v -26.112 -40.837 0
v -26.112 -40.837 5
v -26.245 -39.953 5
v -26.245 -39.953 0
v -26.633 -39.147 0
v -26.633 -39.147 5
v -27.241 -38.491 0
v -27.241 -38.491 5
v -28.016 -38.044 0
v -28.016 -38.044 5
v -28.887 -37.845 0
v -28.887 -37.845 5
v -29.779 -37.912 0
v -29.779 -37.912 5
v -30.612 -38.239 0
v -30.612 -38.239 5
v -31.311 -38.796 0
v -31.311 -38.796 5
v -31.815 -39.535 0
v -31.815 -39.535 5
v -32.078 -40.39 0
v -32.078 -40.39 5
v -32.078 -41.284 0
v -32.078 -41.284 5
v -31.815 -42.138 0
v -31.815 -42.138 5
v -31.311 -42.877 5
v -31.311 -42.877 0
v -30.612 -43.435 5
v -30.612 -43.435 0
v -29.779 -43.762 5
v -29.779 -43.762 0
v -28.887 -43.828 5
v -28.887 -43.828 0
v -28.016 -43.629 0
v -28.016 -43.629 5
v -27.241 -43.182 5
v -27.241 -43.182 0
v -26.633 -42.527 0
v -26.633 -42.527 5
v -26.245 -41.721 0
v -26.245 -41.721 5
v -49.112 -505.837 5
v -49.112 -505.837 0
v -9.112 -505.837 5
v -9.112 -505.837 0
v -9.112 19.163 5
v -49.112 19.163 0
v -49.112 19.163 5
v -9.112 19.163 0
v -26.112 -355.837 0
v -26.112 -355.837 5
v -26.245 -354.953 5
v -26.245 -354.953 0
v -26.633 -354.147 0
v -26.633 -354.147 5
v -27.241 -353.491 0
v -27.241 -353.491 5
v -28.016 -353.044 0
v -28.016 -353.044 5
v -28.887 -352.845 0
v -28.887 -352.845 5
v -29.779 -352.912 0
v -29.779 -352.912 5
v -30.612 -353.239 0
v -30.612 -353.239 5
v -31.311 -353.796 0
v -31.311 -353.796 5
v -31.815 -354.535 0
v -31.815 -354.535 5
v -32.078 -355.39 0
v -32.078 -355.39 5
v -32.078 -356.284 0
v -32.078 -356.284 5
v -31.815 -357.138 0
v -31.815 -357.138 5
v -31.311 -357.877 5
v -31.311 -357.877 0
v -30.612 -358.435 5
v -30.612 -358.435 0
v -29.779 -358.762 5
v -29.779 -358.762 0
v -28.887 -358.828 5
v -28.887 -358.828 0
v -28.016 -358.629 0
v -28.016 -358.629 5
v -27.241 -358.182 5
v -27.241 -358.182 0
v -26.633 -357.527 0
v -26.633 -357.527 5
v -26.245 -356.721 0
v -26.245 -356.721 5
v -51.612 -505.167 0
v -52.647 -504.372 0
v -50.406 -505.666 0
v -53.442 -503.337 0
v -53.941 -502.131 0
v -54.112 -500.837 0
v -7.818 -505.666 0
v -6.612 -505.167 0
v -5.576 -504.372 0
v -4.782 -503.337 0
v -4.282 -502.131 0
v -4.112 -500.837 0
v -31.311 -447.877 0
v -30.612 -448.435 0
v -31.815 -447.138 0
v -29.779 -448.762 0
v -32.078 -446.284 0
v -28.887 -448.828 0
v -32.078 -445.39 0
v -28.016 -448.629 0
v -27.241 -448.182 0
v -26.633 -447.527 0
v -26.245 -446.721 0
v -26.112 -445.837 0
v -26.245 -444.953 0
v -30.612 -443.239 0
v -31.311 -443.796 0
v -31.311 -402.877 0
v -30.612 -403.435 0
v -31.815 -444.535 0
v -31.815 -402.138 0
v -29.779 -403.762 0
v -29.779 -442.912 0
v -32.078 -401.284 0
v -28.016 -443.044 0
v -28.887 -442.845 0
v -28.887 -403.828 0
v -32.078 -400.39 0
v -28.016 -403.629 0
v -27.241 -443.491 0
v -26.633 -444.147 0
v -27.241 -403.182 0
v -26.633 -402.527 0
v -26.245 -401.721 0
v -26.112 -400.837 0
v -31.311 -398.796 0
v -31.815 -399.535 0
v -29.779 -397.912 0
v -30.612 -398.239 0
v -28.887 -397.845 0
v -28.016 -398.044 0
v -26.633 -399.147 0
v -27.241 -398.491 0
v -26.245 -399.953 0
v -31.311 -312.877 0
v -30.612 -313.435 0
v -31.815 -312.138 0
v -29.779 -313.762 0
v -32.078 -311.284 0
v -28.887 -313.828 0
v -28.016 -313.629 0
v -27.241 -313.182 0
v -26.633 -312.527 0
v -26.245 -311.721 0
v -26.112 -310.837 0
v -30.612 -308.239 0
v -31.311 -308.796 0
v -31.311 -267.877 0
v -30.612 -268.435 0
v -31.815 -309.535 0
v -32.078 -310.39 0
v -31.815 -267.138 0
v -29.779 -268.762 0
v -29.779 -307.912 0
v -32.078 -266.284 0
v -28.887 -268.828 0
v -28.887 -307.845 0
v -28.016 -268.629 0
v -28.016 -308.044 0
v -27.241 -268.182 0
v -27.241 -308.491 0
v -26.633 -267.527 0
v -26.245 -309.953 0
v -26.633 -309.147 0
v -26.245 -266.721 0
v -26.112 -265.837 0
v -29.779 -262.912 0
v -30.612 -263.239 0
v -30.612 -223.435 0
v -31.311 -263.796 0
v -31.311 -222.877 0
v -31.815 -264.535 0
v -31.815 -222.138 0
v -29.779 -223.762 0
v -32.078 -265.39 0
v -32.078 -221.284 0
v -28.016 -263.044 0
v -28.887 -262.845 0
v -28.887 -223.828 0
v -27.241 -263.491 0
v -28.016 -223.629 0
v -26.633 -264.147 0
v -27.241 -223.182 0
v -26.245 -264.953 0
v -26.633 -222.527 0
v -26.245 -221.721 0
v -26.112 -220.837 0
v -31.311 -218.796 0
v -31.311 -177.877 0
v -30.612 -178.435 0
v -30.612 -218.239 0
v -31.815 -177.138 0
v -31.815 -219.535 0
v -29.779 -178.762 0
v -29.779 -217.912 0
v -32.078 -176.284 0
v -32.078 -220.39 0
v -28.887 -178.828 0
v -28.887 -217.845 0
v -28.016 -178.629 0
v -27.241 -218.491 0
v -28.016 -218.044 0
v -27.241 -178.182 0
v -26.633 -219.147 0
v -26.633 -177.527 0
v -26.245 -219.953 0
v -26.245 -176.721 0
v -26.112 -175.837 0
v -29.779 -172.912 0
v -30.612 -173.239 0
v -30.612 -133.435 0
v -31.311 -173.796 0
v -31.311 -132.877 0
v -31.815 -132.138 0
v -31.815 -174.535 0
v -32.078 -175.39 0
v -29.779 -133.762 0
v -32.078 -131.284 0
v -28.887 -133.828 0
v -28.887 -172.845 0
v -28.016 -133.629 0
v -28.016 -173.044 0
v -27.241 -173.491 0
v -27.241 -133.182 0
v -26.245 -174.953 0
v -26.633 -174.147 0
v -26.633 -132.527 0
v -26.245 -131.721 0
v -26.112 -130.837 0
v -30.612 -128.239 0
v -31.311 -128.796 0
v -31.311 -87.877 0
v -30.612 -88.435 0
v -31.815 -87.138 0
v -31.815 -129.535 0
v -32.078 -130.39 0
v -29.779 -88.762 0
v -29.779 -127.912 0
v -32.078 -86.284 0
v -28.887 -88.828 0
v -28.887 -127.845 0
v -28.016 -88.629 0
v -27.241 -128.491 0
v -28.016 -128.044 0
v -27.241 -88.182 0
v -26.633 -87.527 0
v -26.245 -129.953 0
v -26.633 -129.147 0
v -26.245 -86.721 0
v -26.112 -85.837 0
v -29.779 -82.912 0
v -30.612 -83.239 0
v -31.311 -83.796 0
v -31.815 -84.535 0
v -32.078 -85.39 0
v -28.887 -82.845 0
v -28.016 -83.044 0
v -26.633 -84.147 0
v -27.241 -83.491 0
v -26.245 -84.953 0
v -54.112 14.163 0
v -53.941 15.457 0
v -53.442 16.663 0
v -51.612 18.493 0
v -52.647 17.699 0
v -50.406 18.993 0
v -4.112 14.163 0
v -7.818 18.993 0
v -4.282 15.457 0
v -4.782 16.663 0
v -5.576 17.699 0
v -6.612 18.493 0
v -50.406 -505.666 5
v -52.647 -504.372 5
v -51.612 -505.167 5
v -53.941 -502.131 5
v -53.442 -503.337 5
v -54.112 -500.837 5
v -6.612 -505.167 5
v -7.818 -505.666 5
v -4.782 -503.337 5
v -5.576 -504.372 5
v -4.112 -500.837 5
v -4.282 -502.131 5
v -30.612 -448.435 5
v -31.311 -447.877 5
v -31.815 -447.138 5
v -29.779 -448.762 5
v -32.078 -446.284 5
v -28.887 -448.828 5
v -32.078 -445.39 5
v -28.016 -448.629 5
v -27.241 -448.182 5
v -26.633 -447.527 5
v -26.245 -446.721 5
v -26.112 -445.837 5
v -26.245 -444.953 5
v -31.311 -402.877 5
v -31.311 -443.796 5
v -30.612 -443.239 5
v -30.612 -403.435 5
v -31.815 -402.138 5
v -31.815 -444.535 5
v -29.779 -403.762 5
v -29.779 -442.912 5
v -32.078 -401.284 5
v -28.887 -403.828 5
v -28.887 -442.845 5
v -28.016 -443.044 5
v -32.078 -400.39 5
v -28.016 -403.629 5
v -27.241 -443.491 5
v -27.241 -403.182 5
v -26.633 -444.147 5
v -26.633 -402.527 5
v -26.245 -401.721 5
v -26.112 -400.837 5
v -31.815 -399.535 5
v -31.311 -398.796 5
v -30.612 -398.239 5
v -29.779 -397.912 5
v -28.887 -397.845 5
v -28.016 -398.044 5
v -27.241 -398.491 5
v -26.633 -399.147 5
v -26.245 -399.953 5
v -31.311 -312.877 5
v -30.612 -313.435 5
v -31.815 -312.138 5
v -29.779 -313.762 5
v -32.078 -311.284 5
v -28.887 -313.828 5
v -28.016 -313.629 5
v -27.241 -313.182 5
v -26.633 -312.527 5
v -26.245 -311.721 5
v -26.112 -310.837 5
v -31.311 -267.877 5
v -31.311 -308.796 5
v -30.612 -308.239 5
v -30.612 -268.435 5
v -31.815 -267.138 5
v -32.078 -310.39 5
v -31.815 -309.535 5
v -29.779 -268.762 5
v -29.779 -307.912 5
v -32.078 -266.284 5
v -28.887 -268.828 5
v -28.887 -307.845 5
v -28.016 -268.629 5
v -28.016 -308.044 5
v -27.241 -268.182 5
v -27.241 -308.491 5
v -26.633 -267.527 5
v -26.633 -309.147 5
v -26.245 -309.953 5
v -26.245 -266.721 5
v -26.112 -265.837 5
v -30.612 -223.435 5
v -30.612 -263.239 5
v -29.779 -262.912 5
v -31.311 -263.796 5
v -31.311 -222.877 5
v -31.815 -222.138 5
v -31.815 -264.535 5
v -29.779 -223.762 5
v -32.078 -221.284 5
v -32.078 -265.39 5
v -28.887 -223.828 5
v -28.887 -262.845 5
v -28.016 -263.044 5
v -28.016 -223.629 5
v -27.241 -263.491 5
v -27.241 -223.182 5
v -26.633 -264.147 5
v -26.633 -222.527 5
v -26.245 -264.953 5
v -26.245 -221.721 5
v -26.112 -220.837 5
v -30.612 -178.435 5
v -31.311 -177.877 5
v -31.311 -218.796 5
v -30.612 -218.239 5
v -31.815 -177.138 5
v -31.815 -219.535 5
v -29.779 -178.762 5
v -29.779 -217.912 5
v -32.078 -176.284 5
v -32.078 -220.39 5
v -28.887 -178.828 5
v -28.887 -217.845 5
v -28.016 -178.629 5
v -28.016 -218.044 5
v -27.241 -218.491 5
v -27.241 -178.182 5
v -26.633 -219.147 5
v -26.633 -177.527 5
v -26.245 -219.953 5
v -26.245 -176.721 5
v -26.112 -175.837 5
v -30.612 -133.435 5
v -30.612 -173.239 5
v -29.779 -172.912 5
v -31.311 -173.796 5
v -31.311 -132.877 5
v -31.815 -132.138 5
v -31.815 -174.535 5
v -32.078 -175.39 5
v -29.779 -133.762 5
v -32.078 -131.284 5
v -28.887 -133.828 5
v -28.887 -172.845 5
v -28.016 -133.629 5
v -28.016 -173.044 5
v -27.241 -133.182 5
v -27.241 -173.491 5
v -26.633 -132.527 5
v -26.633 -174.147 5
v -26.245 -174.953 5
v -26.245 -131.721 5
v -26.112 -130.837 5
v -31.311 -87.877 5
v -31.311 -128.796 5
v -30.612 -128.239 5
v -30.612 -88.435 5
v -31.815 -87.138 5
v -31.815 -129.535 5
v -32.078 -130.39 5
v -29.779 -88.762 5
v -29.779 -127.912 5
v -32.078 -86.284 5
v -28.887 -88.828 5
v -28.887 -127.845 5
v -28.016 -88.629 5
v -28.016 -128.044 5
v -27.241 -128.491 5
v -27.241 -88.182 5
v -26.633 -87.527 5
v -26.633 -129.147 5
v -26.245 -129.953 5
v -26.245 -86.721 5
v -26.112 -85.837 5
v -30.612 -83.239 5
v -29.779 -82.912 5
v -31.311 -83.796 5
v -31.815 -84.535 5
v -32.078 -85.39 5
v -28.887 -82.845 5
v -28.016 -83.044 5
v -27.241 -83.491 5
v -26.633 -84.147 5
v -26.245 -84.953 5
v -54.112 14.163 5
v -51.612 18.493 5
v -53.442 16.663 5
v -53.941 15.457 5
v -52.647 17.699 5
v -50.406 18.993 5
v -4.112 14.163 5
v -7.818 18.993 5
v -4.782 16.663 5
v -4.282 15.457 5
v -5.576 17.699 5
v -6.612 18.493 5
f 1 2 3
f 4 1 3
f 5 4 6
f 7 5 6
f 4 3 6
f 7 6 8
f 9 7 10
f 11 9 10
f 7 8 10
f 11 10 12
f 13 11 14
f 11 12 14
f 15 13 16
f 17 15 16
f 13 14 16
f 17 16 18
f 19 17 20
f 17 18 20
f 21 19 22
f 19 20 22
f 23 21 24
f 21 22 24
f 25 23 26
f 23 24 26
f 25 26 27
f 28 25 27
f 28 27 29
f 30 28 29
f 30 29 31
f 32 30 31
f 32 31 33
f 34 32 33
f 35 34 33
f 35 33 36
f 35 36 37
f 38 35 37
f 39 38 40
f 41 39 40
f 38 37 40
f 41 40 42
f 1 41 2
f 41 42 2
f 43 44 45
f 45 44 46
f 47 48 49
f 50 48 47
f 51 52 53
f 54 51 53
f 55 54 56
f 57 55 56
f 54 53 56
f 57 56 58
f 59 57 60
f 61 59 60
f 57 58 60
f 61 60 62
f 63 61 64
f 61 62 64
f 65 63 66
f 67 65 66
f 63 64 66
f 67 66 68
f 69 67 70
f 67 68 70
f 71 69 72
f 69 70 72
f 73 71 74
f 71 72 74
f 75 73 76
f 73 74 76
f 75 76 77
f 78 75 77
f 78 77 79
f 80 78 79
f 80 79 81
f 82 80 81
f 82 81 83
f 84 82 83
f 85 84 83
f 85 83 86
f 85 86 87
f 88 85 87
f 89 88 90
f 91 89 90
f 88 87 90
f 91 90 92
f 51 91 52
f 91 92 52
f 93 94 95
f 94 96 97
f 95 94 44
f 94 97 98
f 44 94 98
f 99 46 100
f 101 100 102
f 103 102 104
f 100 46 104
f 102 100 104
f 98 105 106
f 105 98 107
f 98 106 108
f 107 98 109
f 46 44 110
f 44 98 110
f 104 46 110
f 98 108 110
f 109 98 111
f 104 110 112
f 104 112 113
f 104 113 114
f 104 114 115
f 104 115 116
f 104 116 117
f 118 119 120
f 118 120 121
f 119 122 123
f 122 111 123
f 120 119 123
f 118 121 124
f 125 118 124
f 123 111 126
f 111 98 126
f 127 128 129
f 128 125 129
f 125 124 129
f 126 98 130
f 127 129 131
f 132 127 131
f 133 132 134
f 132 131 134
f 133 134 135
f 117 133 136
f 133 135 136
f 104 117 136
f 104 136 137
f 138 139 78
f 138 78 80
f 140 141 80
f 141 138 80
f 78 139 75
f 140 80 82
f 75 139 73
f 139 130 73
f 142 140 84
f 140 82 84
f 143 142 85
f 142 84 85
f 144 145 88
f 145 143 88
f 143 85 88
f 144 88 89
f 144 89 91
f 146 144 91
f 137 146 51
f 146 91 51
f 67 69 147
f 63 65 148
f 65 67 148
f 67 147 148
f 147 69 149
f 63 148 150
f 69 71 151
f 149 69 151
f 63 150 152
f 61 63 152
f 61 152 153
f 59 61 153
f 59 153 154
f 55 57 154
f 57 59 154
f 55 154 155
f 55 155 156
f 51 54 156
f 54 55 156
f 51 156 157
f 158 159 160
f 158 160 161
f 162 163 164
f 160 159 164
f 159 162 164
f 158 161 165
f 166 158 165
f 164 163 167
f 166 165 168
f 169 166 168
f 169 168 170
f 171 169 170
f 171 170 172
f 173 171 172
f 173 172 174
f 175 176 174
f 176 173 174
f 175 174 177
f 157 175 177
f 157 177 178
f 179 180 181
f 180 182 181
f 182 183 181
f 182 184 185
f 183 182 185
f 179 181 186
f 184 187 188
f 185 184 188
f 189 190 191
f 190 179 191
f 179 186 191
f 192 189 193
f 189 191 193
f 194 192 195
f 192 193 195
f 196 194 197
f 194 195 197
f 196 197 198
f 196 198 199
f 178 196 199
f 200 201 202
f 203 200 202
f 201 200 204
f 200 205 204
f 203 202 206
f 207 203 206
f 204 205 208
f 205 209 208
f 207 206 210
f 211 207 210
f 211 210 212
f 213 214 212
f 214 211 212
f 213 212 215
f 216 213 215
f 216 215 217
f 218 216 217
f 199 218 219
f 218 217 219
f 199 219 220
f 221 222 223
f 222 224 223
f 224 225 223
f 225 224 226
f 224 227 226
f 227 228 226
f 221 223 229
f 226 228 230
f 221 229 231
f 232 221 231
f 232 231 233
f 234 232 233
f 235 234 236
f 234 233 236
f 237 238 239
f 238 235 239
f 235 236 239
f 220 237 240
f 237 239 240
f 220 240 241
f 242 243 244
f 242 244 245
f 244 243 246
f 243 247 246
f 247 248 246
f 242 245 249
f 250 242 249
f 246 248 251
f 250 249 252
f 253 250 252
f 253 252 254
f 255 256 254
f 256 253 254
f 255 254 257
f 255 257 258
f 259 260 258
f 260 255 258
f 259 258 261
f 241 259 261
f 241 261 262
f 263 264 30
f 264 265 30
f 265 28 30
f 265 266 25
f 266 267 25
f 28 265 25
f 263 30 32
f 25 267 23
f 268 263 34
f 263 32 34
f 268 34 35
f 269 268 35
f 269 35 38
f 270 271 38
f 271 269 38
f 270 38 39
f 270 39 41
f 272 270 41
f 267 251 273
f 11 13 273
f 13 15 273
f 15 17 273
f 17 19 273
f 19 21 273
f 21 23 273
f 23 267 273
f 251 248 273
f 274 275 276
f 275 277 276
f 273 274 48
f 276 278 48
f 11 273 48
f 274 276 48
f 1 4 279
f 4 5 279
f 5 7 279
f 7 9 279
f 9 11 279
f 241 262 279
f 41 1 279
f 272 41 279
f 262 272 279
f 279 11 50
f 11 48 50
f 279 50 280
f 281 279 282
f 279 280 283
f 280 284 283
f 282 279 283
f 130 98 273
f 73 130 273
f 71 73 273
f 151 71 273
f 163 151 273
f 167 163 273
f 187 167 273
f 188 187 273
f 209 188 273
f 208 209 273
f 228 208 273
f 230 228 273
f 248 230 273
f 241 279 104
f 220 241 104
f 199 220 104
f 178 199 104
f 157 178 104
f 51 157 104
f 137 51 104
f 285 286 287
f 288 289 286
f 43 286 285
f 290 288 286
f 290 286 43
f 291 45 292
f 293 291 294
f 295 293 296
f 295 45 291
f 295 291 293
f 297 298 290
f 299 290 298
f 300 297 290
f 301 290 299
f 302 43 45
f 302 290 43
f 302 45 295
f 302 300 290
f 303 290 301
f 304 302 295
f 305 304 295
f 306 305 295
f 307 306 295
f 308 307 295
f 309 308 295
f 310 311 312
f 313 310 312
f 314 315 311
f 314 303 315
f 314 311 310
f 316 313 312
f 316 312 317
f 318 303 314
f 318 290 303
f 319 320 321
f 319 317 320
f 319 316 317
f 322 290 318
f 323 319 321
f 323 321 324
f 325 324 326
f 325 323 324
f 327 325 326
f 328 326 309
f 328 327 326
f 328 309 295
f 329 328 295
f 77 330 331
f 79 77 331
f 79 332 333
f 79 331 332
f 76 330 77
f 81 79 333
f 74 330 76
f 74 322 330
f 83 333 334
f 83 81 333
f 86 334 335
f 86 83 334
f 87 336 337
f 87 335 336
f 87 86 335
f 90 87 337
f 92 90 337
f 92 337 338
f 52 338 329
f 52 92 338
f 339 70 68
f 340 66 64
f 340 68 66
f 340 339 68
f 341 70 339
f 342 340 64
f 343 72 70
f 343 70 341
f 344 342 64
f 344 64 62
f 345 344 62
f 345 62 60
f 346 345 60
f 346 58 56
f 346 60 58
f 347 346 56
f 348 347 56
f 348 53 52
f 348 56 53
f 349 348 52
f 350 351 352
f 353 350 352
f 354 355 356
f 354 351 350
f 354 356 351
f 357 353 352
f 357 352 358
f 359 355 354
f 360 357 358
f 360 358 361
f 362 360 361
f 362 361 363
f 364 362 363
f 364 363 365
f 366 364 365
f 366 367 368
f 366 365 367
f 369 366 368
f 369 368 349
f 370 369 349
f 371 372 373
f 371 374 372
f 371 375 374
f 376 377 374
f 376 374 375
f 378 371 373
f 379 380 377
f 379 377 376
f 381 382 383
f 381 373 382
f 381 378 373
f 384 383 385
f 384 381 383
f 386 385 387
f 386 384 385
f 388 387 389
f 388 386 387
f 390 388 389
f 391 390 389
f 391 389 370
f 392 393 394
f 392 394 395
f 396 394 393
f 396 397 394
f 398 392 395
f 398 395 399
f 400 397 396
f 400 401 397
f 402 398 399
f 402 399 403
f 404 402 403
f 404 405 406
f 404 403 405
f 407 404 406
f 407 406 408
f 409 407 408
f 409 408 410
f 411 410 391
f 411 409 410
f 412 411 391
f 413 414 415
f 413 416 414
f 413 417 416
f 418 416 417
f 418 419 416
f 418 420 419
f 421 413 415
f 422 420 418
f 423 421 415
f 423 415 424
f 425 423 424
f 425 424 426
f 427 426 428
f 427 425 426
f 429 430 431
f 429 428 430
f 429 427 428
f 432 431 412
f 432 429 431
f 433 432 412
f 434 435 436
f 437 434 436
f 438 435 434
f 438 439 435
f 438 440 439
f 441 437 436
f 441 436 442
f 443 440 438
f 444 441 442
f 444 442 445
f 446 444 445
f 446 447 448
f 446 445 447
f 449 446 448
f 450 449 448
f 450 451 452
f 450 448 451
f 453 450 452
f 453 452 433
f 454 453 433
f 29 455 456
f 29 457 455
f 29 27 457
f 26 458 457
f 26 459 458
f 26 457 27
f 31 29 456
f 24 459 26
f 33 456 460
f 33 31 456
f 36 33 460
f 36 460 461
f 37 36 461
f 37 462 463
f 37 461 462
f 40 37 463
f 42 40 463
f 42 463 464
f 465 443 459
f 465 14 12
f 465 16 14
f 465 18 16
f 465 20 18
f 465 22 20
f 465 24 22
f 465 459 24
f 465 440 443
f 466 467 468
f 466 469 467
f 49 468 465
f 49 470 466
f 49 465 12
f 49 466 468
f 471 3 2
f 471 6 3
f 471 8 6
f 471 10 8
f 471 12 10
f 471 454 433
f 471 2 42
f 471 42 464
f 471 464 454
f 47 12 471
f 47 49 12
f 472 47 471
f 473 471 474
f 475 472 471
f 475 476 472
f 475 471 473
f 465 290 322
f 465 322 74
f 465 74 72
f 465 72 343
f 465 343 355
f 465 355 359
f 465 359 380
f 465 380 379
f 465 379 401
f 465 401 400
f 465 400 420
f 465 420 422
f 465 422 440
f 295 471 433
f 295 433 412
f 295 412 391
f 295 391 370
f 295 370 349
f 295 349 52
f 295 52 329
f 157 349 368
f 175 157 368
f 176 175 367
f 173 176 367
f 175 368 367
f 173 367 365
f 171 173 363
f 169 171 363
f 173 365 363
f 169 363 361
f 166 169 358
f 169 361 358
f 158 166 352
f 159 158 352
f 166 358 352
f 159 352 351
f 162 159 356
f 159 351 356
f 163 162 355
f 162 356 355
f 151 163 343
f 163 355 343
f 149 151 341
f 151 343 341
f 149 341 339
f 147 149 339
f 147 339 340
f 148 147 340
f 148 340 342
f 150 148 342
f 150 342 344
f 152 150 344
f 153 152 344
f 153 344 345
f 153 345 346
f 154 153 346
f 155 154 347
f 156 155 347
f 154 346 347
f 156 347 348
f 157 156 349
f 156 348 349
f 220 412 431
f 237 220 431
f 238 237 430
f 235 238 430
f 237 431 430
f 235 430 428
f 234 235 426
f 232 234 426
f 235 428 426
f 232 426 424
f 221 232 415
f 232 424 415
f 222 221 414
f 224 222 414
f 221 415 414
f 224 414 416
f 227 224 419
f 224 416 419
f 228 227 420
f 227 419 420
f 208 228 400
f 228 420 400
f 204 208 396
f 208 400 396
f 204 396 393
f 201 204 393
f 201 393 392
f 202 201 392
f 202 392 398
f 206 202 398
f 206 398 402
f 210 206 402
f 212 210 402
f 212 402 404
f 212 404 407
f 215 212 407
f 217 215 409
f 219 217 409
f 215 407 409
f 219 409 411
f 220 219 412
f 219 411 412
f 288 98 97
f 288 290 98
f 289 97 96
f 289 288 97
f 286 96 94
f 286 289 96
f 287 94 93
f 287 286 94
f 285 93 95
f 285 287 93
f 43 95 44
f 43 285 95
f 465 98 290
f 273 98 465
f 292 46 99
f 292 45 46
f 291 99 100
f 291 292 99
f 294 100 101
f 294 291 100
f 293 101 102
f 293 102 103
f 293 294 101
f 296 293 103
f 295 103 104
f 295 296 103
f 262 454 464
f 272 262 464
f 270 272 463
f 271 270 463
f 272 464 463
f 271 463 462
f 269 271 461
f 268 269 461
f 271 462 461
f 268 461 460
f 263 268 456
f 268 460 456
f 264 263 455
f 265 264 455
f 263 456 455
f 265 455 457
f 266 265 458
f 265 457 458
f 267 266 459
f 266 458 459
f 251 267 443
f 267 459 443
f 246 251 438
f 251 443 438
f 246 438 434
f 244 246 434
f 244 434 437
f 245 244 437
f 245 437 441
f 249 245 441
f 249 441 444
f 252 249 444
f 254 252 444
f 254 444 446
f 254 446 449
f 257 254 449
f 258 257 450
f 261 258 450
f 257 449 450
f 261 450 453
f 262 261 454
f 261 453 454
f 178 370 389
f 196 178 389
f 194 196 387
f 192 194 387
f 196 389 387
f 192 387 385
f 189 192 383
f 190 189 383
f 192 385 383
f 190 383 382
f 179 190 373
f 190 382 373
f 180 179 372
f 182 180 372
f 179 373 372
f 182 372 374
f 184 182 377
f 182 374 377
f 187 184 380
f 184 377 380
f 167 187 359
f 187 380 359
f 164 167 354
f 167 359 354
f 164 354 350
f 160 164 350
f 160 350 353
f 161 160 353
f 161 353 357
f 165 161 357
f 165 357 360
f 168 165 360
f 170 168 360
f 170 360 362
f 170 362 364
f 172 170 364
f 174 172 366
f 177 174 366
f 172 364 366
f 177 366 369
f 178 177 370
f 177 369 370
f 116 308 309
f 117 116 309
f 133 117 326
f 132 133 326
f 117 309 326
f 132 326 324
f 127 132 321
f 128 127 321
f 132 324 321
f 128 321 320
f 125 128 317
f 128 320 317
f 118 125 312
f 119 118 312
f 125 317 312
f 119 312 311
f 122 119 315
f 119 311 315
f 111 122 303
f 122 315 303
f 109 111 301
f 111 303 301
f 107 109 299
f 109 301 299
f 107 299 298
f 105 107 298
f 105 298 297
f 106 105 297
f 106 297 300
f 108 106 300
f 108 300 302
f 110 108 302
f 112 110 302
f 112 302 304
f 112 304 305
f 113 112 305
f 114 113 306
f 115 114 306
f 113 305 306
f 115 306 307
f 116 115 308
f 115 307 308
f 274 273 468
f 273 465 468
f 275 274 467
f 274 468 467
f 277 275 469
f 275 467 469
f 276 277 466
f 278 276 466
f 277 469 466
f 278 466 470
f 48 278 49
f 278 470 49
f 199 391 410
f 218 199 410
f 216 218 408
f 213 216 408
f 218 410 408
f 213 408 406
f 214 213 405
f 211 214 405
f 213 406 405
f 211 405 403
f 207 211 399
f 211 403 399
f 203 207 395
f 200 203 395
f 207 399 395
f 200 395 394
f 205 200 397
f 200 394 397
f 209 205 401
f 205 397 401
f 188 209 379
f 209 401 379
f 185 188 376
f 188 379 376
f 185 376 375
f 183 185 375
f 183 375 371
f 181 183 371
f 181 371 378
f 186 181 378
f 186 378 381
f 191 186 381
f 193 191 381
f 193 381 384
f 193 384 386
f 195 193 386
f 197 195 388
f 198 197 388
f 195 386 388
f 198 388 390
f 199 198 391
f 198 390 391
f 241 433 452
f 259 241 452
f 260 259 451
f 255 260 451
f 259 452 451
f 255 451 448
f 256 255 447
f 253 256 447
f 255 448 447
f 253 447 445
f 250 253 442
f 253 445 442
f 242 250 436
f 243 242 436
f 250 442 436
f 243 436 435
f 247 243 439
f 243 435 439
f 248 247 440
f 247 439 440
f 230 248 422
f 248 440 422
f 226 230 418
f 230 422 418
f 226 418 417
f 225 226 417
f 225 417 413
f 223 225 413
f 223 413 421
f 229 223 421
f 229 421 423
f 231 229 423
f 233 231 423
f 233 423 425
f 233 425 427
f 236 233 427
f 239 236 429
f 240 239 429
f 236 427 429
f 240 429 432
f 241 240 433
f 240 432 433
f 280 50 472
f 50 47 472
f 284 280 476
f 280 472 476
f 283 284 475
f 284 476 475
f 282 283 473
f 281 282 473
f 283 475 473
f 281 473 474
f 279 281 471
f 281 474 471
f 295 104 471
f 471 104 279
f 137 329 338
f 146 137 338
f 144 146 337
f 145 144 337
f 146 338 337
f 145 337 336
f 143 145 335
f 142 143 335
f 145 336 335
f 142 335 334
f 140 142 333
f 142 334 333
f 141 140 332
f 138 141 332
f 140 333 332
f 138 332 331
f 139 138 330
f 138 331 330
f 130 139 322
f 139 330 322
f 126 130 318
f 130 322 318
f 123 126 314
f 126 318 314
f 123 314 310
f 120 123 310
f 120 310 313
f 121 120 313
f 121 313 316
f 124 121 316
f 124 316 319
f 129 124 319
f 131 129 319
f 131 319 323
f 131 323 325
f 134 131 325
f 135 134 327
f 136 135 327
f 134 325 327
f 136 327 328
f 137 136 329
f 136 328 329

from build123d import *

# Parameters (mm, degrees)
SKETCH_W            = 50
SKETCH_H            = 525
PAD_DEPTH           = 5
SKETCH001_R         = 3
POCKET_DEPTH        = 5
LINEARPATTERN_COUNT = 10
LINEARPATTERN_PITCH = 45
FILLET_R            = 5


with BuildPart() as part:
    # Sketch → Pad (new body)
    with BuildSketch(Plane.XY):
        with Locations((-29.111652, -243.336815)):
            Rectangle(SKETCH_W, SKETCH_H)
    extrude(amount=PAD_DEPTH)

    # Sketch001 (on Face6 of Pad) → Pocket (cut)
    with BuildSketch(Plane.XY.offset(5)):
        with Locations((-29.111652, -445.836815)):
            Circle(SKETCH001_R)
    pocket = extrude(amount=-POCKET_DEPTH, mode=Mode.SUBTRACT)

    # LinearPattern: Pocket ×10
    with Locations(*[(0, i * LINEARPATTERN_PITCH, 0) for i in range(1, LINEARPATTERN_COUNT)]):
        add(pocket, mode=Mode.SUBTRACT)

    # Fillet
    fillet_edges = [part.edges().sort_by_distance(p)[0] for p in [
        (-4.111652, 19.163185, 2.5),
        (-54.111652, 19.163185, 2.5),
        (-4.111652, -505.836815, 2.5),
        (-54.111652, -505.836815, 2.5),
    ]]
    fillet(fillet_edges, radius=FILLET_R)


solid = part.part
